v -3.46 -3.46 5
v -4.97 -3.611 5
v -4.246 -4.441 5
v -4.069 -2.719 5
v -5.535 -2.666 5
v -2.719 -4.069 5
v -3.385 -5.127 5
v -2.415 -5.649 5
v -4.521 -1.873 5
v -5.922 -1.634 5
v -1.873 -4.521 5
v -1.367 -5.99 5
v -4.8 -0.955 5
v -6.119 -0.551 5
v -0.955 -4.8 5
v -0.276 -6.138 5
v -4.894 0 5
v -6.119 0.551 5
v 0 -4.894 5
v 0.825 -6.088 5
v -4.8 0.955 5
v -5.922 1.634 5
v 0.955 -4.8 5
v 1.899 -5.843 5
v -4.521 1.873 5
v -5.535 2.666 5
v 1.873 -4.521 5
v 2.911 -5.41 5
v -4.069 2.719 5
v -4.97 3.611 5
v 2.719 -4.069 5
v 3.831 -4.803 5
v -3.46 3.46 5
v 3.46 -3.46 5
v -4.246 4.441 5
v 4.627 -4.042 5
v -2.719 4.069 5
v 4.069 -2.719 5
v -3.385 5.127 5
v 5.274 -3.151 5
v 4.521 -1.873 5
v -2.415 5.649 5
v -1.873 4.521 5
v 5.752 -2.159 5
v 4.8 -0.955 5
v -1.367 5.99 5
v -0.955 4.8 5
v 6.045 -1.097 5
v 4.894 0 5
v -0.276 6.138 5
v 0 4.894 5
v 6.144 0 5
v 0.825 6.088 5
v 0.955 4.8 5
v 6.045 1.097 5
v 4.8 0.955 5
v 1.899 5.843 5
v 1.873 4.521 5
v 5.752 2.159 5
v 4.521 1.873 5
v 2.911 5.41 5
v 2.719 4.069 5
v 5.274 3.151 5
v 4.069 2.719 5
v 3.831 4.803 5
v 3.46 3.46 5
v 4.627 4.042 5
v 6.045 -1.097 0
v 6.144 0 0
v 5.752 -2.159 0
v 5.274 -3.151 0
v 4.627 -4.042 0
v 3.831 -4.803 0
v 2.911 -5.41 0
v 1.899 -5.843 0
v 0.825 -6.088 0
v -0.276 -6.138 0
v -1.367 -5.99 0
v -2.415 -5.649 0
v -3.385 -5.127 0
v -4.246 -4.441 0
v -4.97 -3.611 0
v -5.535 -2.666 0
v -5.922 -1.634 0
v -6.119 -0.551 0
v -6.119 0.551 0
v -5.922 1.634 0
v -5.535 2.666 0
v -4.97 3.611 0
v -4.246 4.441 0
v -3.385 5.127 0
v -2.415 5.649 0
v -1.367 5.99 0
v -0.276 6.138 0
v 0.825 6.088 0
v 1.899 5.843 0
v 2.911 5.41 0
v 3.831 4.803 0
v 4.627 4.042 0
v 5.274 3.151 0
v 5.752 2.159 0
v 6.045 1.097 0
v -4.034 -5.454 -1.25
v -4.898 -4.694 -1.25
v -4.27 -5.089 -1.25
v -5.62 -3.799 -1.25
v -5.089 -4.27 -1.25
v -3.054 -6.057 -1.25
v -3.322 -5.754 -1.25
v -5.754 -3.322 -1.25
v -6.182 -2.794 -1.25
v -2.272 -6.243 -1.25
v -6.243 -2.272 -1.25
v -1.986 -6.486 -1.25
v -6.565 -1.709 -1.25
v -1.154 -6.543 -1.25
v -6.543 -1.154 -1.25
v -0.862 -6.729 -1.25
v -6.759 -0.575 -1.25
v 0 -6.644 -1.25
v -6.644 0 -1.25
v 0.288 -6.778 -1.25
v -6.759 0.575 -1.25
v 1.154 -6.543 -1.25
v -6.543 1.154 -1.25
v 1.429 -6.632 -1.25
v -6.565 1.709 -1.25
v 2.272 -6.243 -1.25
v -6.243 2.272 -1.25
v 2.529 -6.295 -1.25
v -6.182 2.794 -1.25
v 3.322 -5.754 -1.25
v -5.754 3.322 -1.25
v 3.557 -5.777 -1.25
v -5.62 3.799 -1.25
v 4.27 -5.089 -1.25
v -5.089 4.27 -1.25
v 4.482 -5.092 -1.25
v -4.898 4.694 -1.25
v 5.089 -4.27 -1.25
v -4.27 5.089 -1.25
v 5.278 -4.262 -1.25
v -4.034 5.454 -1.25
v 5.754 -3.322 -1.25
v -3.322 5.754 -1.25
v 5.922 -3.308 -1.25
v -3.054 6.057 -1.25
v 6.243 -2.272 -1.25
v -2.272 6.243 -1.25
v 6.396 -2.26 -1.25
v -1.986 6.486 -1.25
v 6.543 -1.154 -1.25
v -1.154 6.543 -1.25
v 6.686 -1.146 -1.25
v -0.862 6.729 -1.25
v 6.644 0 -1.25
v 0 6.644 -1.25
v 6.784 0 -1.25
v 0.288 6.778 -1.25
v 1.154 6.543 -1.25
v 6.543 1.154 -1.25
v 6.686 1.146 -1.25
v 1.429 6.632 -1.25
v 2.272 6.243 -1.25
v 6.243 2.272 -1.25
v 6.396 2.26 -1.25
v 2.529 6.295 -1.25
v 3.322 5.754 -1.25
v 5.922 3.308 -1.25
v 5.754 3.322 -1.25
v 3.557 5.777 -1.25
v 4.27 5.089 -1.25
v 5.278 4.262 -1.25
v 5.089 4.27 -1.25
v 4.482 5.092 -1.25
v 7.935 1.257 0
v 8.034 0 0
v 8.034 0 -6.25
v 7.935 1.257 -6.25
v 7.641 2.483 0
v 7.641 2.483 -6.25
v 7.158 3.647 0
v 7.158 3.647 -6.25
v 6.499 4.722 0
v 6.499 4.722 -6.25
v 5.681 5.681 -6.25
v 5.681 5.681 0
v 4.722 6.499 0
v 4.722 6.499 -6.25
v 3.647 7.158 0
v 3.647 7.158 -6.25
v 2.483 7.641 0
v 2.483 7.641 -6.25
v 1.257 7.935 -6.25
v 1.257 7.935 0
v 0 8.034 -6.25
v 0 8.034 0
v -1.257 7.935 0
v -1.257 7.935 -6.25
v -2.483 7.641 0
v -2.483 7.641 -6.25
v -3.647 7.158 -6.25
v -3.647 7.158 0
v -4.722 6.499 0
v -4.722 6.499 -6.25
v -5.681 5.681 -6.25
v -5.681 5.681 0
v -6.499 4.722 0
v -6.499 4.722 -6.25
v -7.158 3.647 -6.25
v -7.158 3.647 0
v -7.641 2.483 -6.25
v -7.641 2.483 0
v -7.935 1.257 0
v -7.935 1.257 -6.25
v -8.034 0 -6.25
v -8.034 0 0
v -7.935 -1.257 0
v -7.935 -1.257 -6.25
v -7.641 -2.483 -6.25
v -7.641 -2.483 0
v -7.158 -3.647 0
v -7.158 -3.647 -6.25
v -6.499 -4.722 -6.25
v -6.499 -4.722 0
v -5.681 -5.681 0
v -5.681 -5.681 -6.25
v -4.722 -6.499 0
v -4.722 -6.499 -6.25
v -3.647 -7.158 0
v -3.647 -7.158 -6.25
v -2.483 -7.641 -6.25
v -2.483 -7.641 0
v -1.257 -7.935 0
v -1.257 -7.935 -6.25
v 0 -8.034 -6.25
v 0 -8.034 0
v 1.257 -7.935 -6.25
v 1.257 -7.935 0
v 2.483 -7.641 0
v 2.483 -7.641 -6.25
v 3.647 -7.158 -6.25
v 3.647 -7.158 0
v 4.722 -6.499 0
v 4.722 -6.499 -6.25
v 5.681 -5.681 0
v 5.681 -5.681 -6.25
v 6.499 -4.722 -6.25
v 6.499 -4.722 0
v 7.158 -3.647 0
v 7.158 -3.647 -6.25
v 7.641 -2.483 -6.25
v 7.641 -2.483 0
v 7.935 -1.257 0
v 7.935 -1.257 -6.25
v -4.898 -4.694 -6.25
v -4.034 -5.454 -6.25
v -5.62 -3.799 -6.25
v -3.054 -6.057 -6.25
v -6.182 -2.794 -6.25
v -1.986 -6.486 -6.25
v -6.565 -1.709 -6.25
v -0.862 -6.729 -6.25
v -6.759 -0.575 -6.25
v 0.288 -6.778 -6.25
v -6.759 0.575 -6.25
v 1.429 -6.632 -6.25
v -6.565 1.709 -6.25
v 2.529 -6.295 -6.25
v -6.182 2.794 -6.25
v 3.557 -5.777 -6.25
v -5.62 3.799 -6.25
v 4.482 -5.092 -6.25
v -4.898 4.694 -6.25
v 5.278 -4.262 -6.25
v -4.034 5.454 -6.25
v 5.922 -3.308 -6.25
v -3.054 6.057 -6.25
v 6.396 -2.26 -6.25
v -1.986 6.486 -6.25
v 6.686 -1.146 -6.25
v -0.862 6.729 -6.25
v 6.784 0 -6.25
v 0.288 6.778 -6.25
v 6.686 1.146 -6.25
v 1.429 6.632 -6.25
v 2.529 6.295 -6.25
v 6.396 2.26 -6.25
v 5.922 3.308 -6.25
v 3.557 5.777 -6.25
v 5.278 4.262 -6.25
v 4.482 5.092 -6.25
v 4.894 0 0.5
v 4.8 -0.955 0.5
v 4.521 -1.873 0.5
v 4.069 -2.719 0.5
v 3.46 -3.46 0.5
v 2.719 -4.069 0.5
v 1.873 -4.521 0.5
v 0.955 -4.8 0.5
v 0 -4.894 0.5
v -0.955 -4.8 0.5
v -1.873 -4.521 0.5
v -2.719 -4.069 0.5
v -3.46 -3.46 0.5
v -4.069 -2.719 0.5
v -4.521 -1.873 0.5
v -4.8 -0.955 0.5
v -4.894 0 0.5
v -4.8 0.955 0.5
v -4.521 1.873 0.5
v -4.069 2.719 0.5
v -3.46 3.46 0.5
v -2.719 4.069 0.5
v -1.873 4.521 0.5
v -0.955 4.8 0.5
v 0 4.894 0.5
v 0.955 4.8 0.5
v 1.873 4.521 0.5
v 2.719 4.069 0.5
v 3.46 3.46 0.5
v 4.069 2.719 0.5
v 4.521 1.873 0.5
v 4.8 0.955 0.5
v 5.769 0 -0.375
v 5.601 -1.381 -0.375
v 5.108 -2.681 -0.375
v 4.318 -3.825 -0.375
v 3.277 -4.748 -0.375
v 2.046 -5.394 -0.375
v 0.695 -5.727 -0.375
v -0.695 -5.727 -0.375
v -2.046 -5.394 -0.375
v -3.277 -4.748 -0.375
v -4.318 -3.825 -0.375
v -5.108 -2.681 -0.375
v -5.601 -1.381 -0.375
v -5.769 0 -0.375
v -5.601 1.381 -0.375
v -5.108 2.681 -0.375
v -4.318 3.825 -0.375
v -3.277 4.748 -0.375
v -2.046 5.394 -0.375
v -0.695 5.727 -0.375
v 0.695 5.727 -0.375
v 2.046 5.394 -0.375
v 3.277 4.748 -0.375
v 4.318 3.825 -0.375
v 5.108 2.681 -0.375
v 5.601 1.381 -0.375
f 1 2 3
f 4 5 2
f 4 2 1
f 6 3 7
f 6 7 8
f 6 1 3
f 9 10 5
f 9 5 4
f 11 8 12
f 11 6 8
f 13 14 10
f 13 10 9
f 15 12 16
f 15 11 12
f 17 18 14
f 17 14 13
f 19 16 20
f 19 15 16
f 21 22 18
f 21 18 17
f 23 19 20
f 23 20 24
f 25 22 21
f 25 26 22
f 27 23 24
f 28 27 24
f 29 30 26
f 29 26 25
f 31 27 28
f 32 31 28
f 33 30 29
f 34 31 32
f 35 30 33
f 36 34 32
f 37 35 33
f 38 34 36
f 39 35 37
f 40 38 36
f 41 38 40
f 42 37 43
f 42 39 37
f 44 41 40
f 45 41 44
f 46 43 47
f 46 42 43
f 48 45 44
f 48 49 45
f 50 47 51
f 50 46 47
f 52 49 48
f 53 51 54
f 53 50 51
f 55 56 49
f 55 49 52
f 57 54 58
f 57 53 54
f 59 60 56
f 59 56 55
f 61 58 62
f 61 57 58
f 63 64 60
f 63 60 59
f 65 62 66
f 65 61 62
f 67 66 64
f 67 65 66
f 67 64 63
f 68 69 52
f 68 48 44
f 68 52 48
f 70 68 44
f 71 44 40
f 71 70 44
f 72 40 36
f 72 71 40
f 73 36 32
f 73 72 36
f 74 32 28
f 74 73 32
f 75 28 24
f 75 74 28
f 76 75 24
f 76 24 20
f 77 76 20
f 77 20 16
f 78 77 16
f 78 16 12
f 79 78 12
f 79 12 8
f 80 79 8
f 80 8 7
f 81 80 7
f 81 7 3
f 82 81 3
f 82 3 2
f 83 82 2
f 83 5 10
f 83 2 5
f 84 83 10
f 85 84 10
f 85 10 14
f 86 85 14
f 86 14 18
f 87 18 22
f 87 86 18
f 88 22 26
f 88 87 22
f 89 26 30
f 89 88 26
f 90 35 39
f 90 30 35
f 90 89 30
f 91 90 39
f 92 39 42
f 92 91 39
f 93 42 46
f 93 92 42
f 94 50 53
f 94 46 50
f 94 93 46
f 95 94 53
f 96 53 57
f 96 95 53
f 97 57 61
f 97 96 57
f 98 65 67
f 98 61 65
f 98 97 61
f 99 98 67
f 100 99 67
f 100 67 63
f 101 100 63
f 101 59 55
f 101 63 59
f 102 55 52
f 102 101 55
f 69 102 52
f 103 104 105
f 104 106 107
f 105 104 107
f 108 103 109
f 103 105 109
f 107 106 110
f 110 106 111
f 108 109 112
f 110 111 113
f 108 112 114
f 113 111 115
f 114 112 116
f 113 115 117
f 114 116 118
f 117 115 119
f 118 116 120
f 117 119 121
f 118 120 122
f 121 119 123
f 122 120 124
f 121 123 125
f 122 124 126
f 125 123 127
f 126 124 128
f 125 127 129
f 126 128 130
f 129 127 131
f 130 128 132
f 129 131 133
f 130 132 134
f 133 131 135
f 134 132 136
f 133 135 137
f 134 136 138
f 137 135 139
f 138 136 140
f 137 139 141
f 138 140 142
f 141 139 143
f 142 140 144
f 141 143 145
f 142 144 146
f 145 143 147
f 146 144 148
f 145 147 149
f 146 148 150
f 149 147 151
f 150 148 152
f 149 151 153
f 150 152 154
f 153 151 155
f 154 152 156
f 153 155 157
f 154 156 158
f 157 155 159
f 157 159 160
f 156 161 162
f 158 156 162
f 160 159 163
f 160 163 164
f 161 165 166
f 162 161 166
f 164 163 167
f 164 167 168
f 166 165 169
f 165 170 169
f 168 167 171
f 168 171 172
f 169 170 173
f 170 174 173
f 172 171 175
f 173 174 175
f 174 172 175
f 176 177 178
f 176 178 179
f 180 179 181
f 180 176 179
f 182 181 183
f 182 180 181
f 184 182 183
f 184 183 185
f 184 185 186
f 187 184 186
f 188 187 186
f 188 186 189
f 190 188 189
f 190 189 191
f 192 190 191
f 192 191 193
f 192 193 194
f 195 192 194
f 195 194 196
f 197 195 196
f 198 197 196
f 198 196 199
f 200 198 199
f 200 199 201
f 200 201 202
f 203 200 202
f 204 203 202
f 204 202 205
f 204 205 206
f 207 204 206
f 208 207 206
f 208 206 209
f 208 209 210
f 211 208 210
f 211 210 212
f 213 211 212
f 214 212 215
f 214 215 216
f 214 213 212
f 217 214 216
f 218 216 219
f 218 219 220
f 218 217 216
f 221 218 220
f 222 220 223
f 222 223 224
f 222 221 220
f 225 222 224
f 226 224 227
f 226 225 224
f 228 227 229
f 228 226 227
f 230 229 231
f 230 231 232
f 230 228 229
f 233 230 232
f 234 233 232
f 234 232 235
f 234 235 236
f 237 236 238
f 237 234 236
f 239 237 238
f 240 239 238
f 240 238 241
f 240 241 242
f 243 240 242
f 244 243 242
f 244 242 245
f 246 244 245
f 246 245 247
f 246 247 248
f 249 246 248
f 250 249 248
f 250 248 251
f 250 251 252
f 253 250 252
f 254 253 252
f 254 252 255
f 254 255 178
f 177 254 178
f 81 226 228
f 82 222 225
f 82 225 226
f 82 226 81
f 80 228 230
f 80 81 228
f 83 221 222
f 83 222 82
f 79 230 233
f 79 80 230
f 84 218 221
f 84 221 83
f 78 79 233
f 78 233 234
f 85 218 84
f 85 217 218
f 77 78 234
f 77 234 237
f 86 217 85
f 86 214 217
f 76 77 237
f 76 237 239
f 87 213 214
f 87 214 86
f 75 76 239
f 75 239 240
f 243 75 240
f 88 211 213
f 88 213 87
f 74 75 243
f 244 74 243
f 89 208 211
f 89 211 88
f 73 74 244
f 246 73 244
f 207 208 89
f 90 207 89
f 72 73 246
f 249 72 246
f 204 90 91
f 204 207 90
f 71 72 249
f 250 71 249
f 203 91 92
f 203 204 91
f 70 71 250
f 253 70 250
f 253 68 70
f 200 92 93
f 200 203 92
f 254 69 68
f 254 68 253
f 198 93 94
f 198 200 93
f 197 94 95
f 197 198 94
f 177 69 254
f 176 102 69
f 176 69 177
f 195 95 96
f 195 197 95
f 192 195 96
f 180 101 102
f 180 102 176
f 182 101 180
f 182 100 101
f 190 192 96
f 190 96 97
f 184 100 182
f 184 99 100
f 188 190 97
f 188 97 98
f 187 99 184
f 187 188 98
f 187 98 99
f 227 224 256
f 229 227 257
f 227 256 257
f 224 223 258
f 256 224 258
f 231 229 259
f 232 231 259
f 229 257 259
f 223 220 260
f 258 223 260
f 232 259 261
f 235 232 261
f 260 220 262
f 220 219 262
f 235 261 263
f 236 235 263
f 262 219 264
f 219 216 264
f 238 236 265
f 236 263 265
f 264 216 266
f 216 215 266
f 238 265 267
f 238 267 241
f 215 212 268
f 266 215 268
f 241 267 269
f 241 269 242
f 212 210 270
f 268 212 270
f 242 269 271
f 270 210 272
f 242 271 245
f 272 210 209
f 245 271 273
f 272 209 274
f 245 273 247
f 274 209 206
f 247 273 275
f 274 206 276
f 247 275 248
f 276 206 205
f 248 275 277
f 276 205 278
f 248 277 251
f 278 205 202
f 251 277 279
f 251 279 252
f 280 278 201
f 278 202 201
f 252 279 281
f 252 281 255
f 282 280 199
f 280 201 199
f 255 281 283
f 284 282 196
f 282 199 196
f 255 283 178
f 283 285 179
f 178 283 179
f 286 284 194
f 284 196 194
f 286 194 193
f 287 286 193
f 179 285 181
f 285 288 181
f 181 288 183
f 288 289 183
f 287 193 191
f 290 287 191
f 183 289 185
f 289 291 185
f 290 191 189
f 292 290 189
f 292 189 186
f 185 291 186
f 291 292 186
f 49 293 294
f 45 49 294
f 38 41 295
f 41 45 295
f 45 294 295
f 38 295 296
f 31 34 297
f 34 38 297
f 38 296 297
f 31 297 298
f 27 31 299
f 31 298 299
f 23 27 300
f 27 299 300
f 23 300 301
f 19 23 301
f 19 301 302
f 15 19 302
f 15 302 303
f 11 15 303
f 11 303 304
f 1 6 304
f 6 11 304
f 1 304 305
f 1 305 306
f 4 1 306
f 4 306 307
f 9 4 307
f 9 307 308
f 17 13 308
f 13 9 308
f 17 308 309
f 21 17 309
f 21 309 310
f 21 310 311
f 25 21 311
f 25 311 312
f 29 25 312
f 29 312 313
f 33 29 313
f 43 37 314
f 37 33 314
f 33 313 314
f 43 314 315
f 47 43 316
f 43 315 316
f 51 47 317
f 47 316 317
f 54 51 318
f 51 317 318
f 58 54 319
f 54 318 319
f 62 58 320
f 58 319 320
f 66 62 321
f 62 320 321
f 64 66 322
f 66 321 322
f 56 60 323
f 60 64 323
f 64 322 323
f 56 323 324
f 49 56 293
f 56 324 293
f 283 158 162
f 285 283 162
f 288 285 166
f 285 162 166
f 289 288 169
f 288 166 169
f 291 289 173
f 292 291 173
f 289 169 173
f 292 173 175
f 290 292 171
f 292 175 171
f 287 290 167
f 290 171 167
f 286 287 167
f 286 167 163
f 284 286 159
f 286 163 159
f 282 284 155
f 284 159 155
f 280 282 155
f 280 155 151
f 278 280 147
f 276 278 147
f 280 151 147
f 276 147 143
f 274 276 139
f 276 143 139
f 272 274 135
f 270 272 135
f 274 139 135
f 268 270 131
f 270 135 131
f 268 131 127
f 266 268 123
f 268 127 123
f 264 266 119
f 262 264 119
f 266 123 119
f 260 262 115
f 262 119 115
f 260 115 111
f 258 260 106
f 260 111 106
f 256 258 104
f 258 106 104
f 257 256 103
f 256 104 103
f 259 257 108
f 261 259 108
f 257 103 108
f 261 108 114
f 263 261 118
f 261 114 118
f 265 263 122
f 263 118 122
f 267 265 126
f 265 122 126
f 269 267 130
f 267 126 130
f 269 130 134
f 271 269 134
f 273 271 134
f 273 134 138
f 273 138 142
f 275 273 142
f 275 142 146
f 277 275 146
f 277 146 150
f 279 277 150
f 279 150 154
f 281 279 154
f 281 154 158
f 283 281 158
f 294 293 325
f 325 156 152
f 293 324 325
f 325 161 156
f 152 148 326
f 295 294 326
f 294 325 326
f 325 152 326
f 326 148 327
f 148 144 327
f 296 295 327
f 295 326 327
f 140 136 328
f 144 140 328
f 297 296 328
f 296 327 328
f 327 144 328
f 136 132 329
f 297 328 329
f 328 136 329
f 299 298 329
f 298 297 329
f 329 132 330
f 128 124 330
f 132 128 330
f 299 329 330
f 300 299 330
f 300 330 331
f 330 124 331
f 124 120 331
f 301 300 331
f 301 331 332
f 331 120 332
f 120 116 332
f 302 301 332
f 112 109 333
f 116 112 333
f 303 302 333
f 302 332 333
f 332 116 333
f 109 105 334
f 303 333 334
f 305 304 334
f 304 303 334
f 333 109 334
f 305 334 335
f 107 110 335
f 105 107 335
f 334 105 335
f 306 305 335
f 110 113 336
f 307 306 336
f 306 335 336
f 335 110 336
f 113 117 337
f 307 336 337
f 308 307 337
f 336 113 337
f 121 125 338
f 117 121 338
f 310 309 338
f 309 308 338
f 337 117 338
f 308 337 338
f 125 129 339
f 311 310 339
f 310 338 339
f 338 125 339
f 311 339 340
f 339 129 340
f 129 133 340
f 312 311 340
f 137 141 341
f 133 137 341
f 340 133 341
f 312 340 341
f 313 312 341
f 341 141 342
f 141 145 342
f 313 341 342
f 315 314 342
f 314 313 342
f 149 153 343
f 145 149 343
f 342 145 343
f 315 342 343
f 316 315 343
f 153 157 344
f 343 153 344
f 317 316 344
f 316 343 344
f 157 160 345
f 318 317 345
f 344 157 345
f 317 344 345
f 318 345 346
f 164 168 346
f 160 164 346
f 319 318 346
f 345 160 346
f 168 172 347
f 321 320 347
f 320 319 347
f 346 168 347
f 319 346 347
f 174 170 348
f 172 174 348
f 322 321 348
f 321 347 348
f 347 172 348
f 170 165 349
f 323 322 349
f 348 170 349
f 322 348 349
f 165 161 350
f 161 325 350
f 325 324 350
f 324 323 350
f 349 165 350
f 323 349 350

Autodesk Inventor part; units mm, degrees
ref_plane "YZ Plane" through (0, 0, 0) normal (1, 0, 0) x (0, 1, 0)
ref_plane "XZ Plane" through (0, 0, 0) normal (0, 1, 0) x (-1, 0, 0)
ref_plane "XY Plane" through (0, 0, 0) normal (0, 0, 1) x (1, 0, 0)
sketch "Sketch1" plane through (0, 0, 0) normal (0, 0, 1) x (1, 0, 0)
  circle A0 centre (0, 0) radius 6.1437
  circle A1 centre (0, 0) radius 4.8937
  circle A2 centre (0, 0) radius 13.125
  circle A3 centre (0, 0) radius 6.7838
  circle A4 centre (0, 0) radius 14.375
  circle A5 centre (0, 0) radius 8.0337
  dimension "d0" = 12.2875
  dimension "d1" = 1.25
  dimension "d4" = 26.25
  dimension "d5" = 13.5675
  dimension "d6" = 1.25
  dimension "d7" = 1.25
extrude "Extrusion1" add sketch "Sketch1" along normal blind 5 contours A0
extrude "Extrusion2" add sketch "Sketch1" against normal blind 1.25 contours A0 | A3 | A5
extrude "Extrusion3" add sketch "Sketch1" against normal blind 5 from surface at -1.25 contours A5
chamfer "Chamfer1" distance 1.75 angle 45 1 edges at (-4.8937, 0, -1.25)
properties part number "Filter Adapter (SM05)"
